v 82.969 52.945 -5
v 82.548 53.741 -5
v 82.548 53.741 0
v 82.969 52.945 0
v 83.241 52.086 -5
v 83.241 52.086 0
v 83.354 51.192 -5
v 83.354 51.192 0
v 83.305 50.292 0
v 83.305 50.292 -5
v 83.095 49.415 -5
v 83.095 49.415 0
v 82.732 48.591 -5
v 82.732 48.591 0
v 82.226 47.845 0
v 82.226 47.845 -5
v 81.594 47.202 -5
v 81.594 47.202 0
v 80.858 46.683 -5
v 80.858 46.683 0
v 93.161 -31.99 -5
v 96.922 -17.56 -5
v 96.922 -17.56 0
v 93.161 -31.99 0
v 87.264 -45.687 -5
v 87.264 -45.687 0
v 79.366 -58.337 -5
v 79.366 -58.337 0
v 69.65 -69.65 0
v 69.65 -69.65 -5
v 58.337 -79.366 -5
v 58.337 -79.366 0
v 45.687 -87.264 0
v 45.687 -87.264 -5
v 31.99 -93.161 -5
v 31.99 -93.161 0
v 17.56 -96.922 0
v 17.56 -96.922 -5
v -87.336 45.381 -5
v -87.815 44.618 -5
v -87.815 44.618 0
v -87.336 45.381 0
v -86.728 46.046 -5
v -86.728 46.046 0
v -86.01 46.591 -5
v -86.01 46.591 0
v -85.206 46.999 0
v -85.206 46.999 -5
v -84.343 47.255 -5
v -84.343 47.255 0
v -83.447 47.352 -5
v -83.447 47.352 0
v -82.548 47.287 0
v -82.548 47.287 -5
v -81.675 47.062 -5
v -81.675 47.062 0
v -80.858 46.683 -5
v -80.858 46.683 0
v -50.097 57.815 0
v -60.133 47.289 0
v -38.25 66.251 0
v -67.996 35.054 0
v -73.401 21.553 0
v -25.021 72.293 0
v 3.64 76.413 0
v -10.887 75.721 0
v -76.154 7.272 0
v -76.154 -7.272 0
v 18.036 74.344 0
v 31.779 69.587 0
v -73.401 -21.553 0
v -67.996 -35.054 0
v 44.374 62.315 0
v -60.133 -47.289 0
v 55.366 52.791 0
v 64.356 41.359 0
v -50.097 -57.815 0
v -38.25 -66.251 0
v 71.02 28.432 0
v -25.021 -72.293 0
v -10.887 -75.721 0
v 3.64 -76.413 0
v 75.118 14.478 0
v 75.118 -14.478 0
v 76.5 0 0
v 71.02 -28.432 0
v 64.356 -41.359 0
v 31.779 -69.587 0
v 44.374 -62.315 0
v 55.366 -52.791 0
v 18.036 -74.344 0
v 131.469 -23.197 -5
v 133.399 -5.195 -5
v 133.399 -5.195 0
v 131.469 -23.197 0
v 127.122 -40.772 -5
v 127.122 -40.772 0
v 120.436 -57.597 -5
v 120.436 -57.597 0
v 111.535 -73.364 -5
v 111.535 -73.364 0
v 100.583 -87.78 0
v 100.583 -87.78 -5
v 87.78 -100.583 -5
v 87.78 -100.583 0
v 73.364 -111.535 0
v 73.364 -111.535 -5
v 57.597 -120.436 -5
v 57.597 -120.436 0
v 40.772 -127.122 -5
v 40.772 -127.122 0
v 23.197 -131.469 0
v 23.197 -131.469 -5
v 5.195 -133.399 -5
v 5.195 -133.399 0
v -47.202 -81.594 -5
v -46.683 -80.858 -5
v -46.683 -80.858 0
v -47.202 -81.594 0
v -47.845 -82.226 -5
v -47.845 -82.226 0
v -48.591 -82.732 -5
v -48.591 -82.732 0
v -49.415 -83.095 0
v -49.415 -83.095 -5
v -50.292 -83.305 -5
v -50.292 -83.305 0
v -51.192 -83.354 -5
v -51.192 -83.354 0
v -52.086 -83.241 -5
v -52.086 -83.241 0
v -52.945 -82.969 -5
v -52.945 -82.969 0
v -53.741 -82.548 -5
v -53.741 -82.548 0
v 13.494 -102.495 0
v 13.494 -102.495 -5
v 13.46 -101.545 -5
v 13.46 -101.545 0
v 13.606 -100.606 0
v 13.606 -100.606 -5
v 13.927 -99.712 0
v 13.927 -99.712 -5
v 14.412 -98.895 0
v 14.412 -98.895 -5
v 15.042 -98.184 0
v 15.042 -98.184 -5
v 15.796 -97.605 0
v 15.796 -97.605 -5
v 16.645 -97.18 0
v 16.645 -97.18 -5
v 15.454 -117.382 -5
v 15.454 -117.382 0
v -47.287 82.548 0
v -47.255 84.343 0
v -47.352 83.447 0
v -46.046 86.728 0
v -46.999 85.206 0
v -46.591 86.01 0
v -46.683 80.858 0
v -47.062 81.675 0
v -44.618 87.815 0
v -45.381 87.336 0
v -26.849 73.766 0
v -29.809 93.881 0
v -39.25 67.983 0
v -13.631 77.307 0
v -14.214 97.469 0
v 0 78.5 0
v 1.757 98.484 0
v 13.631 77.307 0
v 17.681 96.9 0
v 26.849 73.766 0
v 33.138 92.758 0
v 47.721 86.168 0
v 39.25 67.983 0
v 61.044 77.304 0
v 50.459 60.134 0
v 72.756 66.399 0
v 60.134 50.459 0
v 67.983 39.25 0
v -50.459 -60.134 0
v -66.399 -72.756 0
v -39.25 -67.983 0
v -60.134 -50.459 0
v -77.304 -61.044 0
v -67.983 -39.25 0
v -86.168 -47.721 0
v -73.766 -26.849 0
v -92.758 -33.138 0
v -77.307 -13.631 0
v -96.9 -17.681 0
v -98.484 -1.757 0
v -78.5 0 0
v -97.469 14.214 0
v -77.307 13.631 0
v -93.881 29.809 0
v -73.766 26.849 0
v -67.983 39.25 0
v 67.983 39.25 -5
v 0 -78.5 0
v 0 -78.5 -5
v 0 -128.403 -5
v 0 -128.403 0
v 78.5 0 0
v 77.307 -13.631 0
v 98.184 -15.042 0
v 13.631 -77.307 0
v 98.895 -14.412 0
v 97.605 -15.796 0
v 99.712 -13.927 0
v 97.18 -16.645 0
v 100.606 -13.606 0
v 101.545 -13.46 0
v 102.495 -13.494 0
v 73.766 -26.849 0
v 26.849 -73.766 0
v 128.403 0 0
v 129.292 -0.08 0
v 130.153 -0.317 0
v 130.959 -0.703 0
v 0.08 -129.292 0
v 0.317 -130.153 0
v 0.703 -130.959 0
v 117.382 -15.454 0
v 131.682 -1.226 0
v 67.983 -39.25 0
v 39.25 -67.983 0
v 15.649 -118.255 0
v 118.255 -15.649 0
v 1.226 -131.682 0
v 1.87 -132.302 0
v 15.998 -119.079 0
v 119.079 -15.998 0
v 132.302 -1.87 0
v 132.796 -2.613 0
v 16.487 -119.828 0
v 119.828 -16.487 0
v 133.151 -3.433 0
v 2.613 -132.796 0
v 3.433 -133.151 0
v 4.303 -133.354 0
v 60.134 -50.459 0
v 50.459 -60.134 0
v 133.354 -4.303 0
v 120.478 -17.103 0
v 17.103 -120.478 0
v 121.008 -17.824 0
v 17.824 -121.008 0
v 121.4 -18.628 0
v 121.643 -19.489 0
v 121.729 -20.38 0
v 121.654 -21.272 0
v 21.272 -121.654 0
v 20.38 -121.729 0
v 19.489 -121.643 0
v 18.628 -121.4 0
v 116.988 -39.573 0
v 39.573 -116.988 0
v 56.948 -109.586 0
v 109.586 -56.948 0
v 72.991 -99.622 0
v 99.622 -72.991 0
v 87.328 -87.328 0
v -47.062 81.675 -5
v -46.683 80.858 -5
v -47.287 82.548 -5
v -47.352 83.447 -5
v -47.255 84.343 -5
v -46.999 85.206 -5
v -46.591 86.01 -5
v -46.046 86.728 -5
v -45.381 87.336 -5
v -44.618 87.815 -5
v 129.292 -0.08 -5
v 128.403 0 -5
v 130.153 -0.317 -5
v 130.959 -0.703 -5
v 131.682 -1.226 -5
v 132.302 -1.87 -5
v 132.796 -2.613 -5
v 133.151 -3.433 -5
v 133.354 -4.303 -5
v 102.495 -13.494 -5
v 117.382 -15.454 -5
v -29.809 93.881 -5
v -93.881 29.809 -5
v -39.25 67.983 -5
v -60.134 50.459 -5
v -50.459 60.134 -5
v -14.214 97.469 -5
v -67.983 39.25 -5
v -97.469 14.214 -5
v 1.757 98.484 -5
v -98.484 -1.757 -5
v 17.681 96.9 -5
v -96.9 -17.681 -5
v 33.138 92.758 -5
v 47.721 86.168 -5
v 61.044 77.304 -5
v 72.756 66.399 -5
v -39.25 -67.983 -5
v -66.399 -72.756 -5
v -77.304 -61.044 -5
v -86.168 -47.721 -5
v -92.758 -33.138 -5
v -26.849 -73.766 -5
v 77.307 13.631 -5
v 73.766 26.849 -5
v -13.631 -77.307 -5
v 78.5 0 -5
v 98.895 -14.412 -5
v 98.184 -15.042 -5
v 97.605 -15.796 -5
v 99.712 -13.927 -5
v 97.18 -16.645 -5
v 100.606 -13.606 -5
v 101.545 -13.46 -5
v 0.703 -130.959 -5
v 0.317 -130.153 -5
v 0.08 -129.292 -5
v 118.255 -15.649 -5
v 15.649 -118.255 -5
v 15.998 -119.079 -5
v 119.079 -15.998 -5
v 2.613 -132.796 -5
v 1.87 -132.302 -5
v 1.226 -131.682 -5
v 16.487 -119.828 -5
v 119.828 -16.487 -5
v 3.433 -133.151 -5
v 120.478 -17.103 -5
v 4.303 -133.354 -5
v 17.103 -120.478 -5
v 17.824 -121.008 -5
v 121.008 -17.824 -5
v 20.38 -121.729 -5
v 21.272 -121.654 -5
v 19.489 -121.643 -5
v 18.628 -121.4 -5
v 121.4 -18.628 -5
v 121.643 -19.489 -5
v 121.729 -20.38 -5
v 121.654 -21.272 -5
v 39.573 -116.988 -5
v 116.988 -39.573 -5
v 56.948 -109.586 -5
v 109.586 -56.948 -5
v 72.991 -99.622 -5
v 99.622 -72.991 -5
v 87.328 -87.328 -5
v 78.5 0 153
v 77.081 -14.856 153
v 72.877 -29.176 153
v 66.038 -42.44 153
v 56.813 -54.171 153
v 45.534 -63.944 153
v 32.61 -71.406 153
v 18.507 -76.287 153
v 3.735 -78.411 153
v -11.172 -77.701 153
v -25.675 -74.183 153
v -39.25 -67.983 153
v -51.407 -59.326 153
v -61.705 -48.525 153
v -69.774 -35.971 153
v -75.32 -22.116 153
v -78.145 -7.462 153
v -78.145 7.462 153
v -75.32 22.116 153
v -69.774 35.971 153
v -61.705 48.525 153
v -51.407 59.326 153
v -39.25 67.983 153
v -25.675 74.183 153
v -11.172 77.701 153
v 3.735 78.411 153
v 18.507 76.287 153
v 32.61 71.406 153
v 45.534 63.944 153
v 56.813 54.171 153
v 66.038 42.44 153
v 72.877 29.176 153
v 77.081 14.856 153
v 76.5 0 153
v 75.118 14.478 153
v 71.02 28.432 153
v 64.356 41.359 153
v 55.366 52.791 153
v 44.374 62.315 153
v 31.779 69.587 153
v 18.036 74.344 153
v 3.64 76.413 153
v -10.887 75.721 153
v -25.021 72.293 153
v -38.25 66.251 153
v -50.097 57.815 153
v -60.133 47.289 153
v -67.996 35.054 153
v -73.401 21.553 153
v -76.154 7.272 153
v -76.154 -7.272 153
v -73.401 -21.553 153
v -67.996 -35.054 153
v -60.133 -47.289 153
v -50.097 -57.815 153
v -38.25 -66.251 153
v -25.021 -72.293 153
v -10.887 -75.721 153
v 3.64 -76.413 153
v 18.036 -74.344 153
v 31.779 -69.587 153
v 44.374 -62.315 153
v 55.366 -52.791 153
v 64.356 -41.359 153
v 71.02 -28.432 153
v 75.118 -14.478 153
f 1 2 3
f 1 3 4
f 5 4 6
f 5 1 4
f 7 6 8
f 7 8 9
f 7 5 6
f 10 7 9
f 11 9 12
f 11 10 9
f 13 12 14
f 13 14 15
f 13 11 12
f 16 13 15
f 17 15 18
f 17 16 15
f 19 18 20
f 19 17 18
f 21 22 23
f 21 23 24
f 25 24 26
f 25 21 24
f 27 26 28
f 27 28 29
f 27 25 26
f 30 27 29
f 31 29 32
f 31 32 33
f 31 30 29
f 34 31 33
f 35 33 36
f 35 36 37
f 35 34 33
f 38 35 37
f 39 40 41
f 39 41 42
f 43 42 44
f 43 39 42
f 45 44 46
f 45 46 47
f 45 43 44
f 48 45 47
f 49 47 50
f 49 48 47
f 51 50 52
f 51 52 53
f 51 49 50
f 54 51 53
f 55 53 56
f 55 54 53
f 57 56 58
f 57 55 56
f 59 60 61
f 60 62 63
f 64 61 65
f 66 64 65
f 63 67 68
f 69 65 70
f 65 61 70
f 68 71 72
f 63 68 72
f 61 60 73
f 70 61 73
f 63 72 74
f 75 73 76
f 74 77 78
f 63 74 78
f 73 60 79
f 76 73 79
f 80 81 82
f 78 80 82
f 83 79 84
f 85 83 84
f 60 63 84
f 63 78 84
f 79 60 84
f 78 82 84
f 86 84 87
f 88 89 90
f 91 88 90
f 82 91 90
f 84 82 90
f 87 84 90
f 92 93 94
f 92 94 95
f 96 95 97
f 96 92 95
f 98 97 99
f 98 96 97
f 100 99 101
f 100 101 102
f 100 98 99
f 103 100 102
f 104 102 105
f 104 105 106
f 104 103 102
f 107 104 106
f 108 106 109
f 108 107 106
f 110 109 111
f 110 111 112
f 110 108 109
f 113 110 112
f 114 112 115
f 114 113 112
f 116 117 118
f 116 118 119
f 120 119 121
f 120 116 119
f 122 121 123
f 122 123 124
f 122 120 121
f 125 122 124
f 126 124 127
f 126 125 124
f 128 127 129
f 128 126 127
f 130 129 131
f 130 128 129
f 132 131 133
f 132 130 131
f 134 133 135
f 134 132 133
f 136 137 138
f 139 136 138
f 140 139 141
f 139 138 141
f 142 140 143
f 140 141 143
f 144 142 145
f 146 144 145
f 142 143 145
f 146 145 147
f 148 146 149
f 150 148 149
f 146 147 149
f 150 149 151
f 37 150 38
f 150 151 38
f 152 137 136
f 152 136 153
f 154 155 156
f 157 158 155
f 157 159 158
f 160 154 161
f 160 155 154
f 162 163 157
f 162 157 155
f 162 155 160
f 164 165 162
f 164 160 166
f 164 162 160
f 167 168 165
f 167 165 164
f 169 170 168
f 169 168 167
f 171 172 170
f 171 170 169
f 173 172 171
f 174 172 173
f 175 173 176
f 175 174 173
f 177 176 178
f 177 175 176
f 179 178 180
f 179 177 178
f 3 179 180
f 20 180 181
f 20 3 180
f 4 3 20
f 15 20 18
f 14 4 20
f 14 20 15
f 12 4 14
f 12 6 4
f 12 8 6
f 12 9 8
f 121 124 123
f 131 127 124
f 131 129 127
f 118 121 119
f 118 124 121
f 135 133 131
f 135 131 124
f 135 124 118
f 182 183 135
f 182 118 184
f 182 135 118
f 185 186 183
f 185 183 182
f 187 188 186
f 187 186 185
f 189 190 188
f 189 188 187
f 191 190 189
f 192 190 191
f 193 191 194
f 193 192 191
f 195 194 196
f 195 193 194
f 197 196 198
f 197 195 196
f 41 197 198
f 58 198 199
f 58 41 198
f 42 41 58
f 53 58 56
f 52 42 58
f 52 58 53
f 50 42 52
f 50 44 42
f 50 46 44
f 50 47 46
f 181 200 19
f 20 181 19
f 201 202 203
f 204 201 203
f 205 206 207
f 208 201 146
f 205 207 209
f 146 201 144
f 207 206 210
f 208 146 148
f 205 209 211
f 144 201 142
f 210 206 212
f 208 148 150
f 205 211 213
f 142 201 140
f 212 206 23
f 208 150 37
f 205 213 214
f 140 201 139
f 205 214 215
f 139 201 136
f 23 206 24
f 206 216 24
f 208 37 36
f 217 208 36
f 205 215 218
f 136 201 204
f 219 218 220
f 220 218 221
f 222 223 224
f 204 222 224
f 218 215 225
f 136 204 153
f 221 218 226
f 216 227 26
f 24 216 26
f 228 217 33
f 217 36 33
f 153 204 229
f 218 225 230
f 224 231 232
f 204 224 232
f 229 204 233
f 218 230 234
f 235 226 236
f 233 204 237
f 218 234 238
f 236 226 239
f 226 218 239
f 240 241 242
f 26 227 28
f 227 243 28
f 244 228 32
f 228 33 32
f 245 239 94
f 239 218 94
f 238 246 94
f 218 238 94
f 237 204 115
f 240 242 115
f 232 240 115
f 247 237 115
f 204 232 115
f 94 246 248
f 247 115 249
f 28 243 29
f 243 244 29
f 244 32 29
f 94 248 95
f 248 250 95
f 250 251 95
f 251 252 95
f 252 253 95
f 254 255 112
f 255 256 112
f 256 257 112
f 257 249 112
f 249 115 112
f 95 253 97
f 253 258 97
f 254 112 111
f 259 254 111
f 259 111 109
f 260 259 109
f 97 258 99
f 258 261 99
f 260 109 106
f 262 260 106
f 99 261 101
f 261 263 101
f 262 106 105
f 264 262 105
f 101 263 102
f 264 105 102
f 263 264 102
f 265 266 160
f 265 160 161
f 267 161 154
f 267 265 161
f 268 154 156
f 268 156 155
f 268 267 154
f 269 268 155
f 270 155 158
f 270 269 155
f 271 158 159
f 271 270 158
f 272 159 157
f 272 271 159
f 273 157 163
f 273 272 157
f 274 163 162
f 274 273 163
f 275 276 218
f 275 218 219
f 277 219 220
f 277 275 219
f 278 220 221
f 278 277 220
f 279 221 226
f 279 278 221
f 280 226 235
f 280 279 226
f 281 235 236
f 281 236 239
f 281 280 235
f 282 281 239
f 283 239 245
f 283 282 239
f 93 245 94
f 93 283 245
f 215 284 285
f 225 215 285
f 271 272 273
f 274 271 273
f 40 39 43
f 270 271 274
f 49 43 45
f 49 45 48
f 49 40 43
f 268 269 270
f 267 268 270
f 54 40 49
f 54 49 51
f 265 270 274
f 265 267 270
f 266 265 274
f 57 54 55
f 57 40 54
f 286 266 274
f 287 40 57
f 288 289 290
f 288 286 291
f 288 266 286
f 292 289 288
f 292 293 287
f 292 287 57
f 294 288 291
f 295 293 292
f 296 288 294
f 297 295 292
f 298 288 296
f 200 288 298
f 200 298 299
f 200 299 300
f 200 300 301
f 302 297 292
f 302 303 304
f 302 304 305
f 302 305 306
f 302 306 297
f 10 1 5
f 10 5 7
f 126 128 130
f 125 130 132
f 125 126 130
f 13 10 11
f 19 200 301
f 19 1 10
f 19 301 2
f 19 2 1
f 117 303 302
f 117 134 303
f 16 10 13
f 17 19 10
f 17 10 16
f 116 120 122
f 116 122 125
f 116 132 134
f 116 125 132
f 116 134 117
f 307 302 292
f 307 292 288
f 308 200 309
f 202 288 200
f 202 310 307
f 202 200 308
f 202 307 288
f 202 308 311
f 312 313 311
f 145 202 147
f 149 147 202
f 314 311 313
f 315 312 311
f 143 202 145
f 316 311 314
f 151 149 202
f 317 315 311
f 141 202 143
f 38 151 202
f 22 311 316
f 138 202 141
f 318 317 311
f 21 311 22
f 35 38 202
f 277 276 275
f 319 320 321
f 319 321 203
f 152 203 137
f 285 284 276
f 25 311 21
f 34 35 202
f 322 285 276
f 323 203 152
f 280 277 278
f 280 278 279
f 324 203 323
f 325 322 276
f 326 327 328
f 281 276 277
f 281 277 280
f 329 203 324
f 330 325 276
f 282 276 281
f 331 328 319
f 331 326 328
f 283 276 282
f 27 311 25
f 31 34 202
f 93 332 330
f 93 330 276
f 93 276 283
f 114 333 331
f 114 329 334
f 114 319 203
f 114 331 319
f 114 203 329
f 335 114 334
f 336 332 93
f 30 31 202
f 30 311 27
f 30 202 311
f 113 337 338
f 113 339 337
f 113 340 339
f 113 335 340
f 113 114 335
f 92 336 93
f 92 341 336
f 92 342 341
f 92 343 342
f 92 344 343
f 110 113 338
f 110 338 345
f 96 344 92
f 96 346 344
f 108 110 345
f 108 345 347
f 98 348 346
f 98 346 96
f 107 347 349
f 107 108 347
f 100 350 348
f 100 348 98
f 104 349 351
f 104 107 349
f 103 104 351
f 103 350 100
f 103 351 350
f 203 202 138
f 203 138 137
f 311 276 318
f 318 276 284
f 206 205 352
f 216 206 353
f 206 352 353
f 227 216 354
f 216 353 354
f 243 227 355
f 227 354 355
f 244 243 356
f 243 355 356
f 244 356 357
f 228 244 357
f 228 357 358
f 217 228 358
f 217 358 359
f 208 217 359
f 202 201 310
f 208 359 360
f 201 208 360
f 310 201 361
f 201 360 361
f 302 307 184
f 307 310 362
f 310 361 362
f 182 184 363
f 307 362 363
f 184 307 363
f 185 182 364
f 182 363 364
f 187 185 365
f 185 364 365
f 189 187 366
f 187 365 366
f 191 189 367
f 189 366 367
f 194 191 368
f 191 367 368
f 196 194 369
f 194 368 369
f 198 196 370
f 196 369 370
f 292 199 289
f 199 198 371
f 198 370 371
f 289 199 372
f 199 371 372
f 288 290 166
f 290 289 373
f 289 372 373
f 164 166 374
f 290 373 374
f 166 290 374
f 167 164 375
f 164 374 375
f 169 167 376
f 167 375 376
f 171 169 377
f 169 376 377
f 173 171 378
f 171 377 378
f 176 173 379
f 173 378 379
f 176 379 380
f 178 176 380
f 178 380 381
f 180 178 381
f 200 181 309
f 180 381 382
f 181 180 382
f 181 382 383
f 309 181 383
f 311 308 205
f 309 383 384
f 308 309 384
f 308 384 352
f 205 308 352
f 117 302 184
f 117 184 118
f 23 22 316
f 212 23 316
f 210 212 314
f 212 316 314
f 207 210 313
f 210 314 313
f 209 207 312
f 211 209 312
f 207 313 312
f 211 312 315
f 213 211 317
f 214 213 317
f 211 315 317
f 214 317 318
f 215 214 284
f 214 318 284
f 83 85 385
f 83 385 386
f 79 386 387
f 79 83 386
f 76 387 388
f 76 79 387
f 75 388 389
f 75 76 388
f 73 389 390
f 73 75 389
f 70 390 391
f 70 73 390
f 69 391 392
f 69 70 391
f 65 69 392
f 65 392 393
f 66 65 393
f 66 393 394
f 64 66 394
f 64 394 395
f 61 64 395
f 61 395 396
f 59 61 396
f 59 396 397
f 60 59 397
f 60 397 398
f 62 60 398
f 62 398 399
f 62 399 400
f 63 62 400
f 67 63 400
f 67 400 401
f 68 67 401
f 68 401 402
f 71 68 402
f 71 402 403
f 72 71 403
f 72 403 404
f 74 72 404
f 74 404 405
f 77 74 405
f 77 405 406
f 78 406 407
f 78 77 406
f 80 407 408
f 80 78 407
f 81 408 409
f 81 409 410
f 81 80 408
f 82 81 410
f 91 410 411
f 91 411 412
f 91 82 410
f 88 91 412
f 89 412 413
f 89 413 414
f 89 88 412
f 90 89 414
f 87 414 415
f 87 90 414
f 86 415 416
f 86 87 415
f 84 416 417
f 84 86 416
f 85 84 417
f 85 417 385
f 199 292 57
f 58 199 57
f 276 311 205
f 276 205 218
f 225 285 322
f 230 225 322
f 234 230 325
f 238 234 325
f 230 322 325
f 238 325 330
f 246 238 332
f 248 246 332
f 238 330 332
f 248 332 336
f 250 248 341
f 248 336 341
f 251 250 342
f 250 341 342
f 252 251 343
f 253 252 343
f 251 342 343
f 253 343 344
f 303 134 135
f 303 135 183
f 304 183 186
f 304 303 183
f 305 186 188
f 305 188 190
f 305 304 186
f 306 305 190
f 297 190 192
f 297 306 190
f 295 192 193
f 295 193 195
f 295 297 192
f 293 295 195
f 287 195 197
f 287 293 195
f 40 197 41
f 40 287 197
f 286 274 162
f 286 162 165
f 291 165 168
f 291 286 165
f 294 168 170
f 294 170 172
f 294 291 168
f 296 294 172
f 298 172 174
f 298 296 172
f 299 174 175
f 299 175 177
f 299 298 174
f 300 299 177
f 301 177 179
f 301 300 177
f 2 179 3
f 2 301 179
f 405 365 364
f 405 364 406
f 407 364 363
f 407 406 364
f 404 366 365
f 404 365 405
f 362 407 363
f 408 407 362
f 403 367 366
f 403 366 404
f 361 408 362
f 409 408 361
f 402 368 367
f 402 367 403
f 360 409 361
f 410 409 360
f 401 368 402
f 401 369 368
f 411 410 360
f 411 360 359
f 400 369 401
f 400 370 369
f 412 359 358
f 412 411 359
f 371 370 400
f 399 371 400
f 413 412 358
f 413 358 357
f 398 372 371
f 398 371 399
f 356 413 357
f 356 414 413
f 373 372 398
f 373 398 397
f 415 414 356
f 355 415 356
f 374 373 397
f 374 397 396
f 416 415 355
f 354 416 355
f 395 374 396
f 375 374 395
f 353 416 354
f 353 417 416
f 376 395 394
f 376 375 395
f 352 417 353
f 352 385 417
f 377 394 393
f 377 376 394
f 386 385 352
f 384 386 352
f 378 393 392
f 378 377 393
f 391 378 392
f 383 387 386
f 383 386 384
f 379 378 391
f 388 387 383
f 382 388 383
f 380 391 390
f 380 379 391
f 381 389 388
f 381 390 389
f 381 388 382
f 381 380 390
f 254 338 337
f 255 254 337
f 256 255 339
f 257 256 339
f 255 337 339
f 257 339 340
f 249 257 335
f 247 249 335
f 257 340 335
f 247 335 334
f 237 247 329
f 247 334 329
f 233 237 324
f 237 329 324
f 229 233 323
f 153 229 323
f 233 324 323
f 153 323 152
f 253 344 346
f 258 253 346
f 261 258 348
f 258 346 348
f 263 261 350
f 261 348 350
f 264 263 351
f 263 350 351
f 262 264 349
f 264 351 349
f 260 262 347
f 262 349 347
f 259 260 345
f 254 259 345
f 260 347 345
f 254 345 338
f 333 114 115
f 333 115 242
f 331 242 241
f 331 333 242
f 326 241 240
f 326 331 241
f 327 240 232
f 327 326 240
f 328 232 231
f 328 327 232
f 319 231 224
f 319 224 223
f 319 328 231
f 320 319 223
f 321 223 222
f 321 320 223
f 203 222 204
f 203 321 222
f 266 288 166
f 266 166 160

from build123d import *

# Parameters (mm, degrees)
SKETCH_R           = 78.5
SKETCH_R_2         = 76.5
PAD_DEPTH          = 153
SKETCH001_R        = 78.5
PAD001_DEPTH       = 5
PAD002_DEPTH       = 5
POLARPATTERN_COUNT = 3
PAD003_DEPTH       = 5


with BuildPart() as part:
    # Sketch → Pad (new body)
    with BuildSketch(Plane.XY):
        Circle(SKETCH_R)
        Circle(SKETCH_R_2, mode=Mode.SUBTRACT)
    extrude(amount=PAD_DEPTH)

    # Sketch001 (on Face3 of Pad) → Pad001 (join)
    with BuildSketch(Plane(origin=(0, 0, 0), x_dir=(1, 0, 0), z_dir=(0, 0, -1))):
        Circle(SKETCH001_R)
    extrude(amount=PAD001_DEPTH)

    # Sketch002 (on Face5 of Pad001) → Pad002 (join)
    with BuildSketch(Plane(origin=(0, 0, -5), x_dir=(1, 0, 0), z_dir=(0, 0, -1))):
        with BuildLine():
            ThreePointArc((78.5, 0), (55.507882, 55.507882), (0, 78.5))
            Line((0, 78.5), (0, 93.366214))
            ThreePointArc((5.26738, 98.35906), (1.560298, 96.99505), (0, 93.366214))
            ThreePointArc((98.35906, 5.26738), (69.650018, 69.650018), (5.26738, 98.35906))
            ThreePointArc((93.366214, 0), (96.99505, 1.560298), (98.35906, 5.26738))
            Line((78.5, 0), (93.366214, 0))
        make_face()
    pad002 = extrude(amount=-PAD002_DEPTH)

    # PolarPattern: Pad002 ×3 about axis
    polarpattern_axis = Axis((0, 0, -5), (0, 0, -1))
    for i in range(1, POLARPATTERN_COUNT):
        add(pad002.rotate(polarpattern_axis, i * 360 / POLARPATTERN_COUNT))

    # Sketch003 (on Face23 of PolarPattern) → Pad003 (join)
    with BuildSketch(Plane(origin=(0, 0, -5), x_dir=(1, 0, 0), z_dir=(0, 0, -1))):
        with BuildLine():
            ThreePointArc((133.3989, 5.194553), (94.398755, 94.398755), (5.194553, 133.3989))
            ThreePointArc((5.194553, 133.3989), (1.533933, 132.006349), (0, 128.402687))
            Line((0, 0), (0, 128.402687))
            Line((0, 0), (128.402687, 0))
            ThreePointArc((128.402687, 0), (132.006349, 1.533933), (133.3989, 5.194553))
        make_face()
        with BuildLine():
            ThreePointArc((121.654228, 21.272019), (87.327687, 87.327687), (21.272019, 121.654228))
            ThreePointArc((21.272019, 121.654228), (17.45138, 120.759069), (15.453579, 117.381587))
            Line((13.493688, 102.494733), (15.453579, 117.381587))
            ThreePointArc((13.493688, 102.494733), (14.41176, 98.895028), (17.559564, 96.922194))
            ThreePointArc((96.922194, 17.559564), (69.650018, 69.650018), (17.559564, 96.922194))
            ThreePointArc((96.922194, 17.559564), (98.895028, 14.41176), (102.494733, 13.493688))
            Line((102.494733, 13.493688), (117.381587, 15.453579))
            ThreePointArc((117.381587, 15.453579), (120.759069, 17.45138), (121.654228, 21.272019))
        make_face(mode=Mode.SUBTRACT)
    extrude(amount=-PAD003_DEPTH)


solid = part.part
